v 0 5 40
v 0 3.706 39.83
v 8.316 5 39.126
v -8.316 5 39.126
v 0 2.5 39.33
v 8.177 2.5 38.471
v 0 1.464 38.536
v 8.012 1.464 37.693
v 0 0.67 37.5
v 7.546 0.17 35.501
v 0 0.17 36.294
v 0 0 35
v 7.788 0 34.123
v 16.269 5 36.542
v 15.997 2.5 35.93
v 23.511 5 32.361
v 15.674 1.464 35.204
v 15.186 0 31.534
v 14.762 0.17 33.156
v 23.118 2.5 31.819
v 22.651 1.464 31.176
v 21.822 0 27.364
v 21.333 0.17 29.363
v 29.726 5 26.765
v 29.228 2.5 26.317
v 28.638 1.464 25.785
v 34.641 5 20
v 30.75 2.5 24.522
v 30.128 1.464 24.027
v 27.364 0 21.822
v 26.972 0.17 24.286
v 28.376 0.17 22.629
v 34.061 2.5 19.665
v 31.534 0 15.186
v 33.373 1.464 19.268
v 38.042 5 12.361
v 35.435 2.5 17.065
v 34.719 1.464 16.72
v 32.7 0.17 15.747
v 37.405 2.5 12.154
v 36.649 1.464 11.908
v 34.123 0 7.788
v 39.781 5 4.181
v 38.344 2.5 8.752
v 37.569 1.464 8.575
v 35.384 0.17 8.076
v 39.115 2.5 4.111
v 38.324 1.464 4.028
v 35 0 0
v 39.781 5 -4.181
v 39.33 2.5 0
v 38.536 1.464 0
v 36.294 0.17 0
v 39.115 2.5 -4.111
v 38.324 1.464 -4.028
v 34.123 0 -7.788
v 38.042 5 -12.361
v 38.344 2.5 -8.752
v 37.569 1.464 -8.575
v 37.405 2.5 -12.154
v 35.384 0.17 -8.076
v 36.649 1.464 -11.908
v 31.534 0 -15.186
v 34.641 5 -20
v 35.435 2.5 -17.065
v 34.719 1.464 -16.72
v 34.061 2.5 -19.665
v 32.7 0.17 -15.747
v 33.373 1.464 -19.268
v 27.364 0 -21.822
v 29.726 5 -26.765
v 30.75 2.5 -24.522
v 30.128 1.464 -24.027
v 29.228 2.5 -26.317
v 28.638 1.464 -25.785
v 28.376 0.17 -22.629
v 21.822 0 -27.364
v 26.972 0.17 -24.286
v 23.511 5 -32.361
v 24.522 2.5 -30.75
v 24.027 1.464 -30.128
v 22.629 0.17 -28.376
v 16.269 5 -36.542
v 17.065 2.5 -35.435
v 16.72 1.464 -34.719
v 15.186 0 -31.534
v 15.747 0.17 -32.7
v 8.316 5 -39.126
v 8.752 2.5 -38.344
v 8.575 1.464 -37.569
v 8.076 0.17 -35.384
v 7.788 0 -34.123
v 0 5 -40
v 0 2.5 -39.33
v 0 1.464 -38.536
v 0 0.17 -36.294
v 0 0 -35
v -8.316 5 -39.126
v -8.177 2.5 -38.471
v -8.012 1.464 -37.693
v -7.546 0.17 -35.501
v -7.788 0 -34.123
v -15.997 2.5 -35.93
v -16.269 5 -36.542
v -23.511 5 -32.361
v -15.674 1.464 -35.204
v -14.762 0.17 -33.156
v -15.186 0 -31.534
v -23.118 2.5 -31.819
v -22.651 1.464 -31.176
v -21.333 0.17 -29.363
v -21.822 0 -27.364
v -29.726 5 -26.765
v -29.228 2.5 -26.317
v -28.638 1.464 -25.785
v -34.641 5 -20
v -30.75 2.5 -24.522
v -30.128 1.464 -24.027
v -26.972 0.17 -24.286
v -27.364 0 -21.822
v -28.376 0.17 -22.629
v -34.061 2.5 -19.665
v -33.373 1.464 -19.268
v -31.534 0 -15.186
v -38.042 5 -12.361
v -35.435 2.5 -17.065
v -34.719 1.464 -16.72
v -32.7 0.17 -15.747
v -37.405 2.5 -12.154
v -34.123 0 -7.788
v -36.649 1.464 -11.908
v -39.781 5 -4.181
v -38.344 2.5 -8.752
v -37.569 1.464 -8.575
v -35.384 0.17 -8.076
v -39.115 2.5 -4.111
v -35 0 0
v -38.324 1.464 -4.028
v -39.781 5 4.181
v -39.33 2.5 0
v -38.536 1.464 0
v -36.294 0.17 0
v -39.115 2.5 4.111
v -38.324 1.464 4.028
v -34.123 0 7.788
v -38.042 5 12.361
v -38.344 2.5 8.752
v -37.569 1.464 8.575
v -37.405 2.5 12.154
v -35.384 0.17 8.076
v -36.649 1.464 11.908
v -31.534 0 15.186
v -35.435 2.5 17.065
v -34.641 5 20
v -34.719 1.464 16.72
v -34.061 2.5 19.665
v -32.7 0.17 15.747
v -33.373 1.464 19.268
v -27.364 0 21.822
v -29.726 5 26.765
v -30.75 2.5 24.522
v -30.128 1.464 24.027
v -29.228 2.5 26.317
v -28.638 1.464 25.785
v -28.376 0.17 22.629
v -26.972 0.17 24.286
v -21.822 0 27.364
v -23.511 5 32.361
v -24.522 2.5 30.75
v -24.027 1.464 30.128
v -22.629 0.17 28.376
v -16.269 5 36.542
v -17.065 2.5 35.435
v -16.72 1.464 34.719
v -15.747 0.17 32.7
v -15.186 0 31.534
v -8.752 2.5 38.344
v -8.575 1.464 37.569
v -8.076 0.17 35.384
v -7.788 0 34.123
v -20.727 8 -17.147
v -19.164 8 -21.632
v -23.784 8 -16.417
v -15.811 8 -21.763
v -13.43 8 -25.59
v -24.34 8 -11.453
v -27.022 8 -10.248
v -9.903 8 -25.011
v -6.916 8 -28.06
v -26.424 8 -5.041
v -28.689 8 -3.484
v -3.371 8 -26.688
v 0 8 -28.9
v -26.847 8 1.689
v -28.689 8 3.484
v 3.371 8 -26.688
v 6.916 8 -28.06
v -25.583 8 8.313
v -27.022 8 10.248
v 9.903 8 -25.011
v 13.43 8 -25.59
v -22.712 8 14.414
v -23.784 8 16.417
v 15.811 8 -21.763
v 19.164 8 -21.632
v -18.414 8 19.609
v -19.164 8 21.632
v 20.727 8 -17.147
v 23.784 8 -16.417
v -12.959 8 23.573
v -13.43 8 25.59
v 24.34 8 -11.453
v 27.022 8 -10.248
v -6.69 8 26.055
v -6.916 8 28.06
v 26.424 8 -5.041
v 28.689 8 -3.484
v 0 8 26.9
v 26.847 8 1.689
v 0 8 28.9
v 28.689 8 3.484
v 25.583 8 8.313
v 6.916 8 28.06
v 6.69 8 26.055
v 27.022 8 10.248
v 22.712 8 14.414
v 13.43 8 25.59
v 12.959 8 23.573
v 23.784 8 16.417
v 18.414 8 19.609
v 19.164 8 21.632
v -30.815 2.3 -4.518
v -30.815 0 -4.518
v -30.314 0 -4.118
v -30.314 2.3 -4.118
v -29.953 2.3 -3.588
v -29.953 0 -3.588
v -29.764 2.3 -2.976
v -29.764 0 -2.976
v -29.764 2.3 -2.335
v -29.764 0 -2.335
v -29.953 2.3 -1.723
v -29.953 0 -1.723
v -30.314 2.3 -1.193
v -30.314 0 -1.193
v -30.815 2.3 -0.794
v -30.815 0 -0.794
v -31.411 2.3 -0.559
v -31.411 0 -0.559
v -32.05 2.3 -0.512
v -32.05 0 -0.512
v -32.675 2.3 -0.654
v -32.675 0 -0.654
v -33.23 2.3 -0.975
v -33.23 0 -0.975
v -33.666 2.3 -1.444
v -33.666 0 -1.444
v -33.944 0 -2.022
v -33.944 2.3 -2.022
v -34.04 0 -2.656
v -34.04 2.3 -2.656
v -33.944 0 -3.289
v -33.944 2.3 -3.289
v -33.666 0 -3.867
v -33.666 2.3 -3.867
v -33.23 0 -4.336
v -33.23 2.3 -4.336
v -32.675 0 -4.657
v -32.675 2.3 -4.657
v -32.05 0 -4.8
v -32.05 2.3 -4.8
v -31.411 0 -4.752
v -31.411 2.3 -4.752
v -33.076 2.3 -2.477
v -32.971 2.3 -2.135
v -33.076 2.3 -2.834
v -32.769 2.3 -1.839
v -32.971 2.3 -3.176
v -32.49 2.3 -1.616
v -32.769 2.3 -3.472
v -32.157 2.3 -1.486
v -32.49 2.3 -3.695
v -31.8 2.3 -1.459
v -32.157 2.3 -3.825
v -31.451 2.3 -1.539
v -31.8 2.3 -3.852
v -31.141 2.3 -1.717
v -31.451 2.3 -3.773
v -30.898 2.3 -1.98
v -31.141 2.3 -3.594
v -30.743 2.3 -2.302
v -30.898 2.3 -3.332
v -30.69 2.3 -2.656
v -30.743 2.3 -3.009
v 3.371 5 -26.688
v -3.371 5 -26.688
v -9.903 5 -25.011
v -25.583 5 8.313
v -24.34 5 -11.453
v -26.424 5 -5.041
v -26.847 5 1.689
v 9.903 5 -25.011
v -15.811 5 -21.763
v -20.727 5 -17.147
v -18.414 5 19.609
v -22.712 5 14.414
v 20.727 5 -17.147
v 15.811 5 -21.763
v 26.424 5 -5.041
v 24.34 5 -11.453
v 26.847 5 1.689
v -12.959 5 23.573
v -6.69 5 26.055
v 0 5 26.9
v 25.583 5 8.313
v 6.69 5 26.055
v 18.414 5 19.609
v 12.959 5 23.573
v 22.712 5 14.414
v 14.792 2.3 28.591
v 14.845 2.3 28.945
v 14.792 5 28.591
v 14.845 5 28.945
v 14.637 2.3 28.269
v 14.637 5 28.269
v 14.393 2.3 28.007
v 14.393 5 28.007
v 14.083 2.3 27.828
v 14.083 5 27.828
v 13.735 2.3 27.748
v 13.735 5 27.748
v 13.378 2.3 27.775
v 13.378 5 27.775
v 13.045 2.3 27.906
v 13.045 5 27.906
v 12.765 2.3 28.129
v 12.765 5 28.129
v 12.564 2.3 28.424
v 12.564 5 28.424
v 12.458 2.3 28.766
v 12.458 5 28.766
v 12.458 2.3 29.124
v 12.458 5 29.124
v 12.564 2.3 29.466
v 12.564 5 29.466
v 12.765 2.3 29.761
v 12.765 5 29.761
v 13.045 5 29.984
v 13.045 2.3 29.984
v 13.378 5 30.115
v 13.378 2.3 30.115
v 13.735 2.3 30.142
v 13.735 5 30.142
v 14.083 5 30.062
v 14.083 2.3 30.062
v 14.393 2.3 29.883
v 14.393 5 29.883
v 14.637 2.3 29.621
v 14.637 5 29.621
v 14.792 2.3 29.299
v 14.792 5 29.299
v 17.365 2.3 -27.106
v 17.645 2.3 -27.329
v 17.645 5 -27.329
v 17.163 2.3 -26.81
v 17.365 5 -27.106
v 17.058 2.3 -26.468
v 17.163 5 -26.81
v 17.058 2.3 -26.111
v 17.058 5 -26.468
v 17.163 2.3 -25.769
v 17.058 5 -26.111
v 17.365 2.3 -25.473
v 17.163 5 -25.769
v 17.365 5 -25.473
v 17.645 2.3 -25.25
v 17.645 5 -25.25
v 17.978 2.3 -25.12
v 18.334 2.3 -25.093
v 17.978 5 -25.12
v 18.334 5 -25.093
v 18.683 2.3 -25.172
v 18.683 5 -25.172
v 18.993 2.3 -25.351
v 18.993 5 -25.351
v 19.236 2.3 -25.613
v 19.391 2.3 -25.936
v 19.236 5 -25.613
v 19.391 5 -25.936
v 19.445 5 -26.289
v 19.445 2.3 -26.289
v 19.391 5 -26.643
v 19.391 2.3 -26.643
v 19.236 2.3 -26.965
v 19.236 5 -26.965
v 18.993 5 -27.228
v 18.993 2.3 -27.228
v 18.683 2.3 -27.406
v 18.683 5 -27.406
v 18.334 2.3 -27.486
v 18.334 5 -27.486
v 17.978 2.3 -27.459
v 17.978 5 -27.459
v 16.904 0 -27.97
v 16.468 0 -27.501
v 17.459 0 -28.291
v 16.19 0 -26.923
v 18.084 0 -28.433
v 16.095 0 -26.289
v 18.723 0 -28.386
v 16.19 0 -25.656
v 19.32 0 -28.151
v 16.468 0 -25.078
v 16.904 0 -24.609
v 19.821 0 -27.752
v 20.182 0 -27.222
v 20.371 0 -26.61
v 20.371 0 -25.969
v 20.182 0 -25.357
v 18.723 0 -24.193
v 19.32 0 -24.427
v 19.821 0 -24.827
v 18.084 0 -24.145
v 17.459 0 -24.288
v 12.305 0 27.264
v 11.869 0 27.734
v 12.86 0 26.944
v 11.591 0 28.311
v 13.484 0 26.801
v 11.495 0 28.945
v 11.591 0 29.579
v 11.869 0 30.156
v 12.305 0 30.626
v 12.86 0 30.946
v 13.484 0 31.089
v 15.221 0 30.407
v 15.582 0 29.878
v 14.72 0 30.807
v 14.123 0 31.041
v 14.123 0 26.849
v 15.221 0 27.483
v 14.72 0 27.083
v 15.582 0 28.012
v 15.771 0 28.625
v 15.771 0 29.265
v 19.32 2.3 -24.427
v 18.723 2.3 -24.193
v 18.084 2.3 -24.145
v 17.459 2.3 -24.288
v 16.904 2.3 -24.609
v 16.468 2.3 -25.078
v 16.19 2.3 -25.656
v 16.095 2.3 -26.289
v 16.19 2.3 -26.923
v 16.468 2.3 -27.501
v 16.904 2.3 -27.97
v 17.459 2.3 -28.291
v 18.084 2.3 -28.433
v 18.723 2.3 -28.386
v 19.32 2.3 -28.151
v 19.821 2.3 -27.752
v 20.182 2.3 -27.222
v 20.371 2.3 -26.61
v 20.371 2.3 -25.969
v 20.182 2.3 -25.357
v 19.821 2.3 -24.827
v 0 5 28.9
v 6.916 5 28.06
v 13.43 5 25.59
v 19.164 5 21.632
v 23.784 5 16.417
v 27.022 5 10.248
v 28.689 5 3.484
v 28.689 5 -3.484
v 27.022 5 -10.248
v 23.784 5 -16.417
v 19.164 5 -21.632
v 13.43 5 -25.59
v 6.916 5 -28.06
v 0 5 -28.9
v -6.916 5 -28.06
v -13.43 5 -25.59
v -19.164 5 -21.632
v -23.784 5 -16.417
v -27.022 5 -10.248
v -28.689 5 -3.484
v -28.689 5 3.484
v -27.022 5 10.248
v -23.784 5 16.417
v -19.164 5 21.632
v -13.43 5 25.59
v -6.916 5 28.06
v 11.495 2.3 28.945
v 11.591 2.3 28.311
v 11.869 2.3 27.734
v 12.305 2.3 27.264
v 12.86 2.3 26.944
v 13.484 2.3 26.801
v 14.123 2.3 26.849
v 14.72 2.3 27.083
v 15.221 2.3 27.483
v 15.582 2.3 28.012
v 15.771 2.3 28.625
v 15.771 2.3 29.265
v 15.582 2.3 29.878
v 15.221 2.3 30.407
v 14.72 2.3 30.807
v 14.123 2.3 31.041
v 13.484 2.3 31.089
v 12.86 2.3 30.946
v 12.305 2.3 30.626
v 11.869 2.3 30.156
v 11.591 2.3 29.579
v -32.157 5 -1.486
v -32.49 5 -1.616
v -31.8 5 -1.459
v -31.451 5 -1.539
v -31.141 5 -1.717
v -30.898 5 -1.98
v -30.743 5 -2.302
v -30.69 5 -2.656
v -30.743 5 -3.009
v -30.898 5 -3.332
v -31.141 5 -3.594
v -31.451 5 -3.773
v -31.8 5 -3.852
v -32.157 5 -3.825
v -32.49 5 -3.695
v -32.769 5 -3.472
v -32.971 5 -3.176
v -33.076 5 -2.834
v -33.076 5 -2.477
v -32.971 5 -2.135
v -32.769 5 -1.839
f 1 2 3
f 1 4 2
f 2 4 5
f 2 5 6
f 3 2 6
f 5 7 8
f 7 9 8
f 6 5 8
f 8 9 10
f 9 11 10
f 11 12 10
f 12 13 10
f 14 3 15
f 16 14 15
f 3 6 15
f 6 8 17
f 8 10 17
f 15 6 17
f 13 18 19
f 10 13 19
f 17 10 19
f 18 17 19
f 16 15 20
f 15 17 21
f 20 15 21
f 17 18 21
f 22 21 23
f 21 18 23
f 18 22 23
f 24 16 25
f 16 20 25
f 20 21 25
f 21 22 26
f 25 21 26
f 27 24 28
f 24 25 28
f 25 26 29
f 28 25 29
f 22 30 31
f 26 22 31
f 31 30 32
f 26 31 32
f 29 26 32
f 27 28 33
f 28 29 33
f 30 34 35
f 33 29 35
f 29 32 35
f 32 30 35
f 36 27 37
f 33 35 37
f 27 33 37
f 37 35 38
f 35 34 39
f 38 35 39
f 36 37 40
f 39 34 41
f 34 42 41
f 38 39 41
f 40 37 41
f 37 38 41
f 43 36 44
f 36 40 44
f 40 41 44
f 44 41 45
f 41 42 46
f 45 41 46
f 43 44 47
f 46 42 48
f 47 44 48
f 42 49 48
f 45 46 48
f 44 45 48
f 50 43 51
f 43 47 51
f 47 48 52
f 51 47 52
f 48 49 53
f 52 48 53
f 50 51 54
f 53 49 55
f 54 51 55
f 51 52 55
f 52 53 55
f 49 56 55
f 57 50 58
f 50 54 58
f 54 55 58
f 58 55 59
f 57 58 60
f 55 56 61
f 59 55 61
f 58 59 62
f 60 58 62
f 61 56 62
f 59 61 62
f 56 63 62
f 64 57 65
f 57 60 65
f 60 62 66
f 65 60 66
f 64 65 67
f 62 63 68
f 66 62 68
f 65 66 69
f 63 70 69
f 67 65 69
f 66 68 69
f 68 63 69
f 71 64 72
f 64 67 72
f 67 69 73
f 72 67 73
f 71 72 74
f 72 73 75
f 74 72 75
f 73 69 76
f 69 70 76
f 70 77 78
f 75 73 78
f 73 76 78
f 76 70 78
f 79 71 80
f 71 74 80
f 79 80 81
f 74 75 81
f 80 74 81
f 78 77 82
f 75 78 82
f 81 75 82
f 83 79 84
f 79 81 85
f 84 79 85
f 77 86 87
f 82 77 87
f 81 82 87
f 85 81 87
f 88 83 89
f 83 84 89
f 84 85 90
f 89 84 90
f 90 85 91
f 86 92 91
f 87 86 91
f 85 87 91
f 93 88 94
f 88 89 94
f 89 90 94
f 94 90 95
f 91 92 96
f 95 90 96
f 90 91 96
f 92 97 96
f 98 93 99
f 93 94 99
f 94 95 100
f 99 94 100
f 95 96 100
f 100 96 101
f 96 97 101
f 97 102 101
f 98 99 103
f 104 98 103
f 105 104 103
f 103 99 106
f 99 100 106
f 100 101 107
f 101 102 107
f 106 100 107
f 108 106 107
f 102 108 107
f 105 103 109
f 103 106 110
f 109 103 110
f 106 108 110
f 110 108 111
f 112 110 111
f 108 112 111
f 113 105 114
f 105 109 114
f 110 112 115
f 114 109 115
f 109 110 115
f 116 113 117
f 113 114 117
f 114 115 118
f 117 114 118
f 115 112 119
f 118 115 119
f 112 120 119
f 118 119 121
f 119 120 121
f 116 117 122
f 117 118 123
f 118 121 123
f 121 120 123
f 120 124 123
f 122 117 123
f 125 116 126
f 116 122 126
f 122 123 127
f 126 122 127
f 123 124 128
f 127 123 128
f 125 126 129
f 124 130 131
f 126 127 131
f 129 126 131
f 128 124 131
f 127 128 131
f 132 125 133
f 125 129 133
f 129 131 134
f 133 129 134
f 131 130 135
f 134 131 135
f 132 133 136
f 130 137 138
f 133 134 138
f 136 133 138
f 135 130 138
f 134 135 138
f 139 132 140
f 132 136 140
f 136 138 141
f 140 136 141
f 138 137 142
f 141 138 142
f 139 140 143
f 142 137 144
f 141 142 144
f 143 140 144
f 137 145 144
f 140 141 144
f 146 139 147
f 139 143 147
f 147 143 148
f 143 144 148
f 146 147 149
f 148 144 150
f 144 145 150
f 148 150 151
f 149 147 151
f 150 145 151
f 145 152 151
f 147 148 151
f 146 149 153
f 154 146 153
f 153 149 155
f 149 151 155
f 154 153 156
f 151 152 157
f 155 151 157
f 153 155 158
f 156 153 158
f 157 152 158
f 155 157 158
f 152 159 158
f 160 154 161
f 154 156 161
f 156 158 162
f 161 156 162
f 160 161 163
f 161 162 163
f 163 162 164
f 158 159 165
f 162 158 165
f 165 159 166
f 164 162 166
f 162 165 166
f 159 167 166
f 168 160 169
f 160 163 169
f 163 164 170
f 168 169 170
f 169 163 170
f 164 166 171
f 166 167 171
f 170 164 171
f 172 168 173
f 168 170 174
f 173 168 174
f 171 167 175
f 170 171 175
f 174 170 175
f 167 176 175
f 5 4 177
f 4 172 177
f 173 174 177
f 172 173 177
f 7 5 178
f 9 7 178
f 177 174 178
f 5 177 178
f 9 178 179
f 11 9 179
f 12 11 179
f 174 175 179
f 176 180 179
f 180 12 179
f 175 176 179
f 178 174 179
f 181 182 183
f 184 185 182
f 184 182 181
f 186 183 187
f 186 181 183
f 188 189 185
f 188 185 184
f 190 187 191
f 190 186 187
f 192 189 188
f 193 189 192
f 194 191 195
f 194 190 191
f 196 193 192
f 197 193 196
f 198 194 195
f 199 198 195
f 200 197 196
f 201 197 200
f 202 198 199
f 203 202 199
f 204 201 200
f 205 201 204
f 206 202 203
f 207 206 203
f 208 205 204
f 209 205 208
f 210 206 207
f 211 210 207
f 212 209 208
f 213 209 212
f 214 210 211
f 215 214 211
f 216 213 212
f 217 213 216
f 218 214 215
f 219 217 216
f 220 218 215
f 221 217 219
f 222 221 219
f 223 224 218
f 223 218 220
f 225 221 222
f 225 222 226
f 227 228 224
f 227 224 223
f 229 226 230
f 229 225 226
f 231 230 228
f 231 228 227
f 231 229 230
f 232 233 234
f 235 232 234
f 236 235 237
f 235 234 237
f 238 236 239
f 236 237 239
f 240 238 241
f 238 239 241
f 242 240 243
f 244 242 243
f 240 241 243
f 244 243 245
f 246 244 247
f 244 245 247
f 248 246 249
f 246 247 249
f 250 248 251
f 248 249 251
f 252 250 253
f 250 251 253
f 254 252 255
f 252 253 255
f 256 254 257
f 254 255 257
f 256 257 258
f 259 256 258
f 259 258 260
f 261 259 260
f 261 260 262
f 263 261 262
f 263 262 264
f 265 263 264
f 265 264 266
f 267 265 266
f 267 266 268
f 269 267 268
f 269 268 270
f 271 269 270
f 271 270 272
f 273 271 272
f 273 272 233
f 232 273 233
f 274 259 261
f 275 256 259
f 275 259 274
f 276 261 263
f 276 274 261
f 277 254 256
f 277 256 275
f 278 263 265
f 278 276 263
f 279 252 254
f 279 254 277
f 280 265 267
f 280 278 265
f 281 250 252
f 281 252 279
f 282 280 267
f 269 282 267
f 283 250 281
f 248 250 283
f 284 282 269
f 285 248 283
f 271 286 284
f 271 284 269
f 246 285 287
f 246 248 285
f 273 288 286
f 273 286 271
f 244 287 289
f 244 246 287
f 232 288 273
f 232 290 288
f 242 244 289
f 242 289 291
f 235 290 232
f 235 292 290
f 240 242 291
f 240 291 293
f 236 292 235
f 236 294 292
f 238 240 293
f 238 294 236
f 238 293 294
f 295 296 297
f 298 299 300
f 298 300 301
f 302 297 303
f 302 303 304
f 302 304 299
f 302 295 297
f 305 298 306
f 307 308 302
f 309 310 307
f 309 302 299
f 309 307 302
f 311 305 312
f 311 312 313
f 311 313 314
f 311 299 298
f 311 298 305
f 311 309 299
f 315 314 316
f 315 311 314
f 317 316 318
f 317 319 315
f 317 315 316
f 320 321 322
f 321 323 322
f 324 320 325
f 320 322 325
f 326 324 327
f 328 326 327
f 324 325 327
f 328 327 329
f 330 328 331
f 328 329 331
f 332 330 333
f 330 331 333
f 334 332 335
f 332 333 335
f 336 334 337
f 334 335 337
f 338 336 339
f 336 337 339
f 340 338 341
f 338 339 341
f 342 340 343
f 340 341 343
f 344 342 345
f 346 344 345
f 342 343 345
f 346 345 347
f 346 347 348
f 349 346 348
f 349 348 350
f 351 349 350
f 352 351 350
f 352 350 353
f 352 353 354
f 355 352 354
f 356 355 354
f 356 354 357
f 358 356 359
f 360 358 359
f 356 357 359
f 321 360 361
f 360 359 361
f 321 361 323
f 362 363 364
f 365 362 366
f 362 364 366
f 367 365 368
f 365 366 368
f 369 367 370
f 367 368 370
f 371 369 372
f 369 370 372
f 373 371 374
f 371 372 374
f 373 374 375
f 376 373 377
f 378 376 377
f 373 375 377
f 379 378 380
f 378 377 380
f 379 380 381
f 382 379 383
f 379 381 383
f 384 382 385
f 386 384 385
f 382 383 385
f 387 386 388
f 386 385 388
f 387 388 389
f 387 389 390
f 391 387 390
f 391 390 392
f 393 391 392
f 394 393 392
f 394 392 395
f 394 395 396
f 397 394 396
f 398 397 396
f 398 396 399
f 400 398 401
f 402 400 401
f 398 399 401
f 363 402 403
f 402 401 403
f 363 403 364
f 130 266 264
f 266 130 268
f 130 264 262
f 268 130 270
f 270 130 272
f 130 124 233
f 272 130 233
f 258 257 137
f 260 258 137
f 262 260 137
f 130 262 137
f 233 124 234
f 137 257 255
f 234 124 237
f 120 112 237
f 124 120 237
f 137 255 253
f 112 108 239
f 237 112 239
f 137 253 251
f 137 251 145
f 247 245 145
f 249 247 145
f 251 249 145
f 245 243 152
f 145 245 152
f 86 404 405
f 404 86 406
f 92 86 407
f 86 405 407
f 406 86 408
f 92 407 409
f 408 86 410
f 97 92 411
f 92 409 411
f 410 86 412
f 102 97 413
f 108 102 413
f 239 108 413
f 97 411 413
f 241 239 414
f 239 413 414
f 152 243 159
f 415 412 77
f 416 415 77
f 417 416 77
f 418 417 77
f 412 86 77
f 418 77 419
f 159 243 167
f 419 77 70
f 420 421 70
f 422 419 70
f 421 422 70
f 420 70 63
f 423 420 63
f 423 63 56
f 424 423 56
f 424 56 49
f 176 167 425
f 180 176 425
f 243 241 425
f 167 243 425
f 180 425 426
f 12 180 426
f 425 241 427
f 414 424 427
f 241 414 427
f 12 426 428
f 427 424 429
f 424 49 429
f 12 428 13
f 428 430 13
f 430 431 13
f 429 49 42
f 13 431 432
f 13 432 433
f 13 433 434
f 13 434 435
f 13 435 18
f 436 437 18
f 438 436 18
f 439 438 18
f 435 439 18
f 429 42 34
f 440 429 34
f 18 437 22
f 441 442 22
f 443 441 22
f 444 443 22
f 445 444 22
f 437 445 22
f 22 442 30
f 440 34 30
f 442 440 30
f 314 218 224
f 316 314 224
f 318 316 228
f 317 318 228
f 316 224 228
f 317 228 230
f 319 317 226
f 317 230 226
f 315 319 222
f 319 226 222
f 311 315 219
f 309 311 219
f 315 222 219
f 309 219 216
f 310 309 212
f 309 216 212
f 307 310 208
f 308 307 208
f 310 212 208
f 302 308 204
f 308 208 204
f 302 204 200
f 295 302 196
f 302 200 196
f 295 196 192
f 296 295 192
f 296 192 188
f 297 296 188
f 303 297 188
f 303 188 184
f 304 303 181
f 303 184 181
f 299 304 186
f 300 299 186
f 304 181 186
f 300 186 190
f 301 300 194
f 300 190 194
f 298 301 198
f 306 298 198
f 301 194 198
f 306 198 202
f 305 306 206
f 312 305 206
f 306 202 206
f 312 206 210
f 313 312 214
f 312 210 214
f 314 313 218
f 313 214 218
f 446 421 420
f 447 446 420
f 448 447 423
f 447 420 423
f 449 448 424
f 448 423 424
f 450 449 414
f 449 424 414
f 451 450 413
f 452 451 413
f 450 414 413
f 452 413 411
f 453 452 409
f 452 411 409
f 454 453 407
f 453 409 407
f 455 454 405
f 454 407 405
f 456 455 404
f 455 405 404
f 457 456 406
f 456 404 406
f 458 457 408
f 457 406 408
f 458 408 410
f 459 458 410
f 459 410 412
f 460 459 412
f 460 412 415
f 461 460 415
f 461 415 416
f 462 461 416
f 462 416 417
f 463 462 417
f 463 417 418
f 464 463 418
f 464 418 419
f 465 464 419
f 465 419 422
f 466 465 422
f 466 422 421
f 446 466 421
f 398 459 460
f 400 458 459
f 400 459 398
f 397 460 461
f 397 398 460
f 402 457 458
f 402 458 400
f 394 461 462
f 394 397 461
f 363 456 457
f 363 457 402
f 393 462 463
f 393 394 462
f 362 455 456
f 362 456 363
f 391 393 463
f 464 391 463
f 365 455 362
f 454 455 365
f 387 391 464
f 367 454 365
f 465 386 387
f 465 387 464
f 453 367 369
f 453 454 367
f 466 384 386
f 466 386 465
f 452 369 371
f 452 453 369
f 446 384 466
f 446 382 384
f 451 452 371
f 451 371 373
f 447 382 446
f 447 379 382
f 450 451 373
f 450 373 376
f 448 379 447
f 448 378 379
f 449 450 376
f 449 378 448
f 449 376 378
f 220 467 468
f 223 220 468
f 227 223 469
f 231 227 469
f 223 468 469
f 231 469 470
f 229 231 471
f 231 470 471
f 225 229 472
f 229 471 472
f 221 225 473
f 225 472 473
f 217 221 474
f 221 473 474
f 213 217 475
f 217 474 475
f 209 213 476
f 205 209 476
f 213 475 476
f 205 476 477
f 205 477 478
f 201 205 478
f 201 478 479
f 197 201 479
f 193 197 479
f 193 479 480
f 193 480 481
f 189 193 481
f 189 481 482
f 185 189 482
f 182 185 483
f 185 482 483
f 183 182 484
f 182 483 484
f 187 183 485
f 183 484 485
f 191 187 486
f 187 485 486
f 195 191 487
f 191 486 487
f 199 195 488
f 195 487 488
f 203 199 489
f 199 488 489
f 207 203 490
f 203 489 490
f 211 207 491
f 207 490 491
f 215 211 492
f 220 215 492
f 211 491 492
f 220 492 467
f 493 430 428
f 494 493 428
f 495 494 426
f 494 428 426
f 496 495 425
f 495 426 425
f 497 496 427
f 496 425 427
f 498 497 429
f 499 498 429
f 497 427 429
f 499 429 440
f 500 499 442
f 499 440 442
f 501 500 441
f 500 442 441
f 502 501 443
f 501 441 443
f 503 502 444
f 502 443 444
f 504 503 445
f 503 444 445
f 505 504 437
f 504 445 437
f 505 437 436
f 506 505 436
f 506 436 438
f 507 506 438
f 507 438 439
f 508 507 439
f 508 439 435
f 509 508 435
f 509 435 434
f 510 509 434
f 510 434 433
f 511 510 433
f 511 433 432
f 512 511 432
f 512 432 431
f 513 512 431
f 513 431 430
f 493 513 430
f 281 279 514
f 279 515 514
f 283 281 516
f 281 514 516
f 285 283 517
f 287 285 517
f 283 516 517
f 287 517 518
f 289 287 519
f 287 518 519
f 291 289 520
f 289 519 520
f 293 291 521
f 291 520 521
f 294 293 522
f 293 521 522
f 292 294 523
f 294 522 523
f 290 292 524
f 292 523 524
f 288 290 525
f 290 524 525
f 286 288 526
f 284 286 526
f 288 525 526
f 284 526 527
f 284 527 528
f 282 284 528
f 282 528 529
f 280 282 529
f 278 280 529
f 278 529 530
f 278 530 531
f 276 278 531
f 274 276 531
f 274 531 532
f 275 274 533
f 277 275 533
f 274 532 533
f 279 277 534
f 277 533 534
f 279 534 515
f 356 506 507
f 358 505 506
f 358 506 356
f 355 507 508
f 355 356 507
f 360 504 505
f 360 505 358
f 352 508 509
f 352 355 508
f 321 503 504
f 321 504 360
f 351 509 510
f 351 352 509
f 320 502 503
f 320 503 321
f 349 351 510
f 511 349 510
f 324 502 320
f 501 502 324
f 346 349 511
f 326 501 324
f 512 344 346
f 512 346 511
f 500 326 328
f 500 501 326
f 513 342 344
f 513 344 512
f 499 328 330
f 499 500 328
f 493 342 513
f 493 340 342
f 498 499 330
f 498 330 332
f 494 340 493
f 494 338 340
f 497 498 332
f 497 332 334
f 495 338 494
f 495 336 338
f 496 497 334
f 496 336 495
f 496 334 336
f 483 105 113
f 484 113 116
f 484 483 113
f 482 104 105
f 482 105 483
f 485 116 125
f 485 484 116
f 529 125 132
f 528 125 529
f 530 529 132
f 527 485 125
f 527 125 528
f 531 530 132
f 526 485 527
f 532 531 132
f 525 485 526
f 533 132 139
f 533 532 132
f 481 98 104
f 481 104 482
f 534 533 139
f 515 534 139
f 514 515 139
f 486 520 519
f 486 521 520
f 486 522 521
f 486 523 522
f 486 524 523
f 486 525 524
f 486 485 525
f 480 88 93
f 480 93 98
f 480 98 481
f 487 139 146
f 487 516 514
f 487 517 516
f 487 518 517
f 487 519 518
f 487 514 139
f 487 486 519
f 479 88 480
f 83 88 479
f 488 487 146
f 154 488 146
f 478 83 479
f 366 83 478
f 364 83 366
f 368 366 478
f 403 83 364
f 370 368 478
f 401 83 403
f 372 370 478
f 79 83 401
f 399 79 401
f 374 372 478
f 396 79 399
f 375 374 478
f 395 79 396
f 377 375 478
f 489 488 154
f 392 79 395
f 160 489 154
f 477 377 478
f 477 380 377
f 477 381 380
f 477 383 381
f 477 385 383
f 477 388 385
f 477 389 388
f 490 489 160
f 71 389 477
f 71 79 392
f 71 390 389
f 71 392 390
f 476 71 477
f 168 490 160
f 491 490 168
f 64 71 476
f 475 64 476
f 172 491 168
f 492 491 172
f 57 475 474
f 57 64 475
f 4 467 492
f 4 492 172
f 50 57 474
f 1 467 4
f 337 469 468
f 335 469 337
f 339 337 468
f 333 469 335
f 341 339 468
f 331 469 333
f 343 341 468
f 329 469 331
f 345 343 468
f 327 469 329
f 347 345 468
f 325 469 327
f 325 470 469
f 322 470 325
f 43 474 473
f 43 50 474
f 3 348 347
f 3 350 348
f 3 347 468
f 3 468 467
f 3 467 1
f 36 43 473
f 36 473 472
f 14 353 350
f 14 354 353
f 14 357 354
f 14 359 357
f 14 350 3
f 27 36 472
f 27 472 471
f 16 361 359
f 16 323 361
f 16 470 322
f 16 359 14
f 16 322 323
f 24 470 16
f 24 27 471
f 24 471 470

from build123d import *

# Parameters (mm, degrees)
SKETCH_1_R                = 40
EXTRUDE_1_DEPTH           = 5
SKETCH_2_R                = 28.9
EXTRUDE_2_DEPTH           = 3
HOLE_WIZARD_1_D           = 2.4
HOLE_WIZARD_1_CBORE_D     = 4.3
HOLE_WIZARD_1_CBORE_DEPTH = 2.3
PATTERN_CIRCULAR_1_COUNT  = 3
SKETCH_7_R                = 26.9
CUT_EXTRUDE_1_DEPTH       = 3
FILLET_1_R                = 5


with BuildPart() as part:
    # 草图1 → 凸台-拉伸1 (new body)
    with BuildSketch(Plane(origin=(0, 0, 0), x_dir=(1, 0, 0), z_dir=(0, 1, 0))):
        with Locations(Location((0, 0, 0), (0, 0, 270))):
            Circle(SKETCH_1_R)
    extrude(amount=EXTRUDE_1_DEPTH)

    # 草图2 → 凸台-拉伸2 (add)
    with BuildSketch(Plane(origin=(0, 5, 0), x_dir=(1, 0, 0), z_dir=(0, 1, 0))):
        with Locations(Location((0, 0, 0), (0, 0, 270))):
            Circle(SKETCH_2_R)
    extrude(amount=EXTRUDE_2_DEPTH)

    # 打孔尺寸(%根据)内六角圆柱头螺钉的类型1 (through all)
    with Locations(Plane(origin=(0, 0, 0), x_dir=(-1, 0, 0), z_dir=(0, -1, 0))):
        with Locations((-13.645026716, -28.945003816)):
            hole_wizard_1 = CounterBoreHole(HOLE_WIZARD_1_D / 2, HOLE_WIZARD_1_CBORE_D / 2, HOLE_WIZARD_1_CBORE_DEPTH)

    # 阵列(圆周)1: 打孔尺寸(%根据)内六角圆柱头螺钉的类型1 ×3 about axis
    pattern_circular_1_axis = Axis((0, 0, 0), (0, 1, 0))
    for i in range(1, PATTERN_CIRCULAR_1_COUNT):
        add(hole_wizard_1.rotate(pattern_circular_1_axis, i * 360 / PATTERN_CIRCULAR_1_COUNT), mode=Mode.SUBTRACT)

    # 草图7 → 切除-拉伸1 (cut)
    with BuildSketch(Plane(origin=(0, 8, 0), x_dir=(1, 0, 0), z_dir=(0, 1, 0))):
        with Locations(Location((0, 0, 0), (0, 0, 270))):
            Circle(SKETCH_7_R)
    extrude(amount=-CUT_EXTRUDE_1_DEPTH, mode=Mode.SUBTRACT)

    # 圆角1
    fillet_1_edges = [part.edges().sort_by_distance(p)[0] for p in [
        (0, 0, -40),
    ]]
    fillet(fillet_1_edges, radius=FILLET_1_R - 0.0001)  # a hair under: the kernel refuses the full size


solid = part.part
